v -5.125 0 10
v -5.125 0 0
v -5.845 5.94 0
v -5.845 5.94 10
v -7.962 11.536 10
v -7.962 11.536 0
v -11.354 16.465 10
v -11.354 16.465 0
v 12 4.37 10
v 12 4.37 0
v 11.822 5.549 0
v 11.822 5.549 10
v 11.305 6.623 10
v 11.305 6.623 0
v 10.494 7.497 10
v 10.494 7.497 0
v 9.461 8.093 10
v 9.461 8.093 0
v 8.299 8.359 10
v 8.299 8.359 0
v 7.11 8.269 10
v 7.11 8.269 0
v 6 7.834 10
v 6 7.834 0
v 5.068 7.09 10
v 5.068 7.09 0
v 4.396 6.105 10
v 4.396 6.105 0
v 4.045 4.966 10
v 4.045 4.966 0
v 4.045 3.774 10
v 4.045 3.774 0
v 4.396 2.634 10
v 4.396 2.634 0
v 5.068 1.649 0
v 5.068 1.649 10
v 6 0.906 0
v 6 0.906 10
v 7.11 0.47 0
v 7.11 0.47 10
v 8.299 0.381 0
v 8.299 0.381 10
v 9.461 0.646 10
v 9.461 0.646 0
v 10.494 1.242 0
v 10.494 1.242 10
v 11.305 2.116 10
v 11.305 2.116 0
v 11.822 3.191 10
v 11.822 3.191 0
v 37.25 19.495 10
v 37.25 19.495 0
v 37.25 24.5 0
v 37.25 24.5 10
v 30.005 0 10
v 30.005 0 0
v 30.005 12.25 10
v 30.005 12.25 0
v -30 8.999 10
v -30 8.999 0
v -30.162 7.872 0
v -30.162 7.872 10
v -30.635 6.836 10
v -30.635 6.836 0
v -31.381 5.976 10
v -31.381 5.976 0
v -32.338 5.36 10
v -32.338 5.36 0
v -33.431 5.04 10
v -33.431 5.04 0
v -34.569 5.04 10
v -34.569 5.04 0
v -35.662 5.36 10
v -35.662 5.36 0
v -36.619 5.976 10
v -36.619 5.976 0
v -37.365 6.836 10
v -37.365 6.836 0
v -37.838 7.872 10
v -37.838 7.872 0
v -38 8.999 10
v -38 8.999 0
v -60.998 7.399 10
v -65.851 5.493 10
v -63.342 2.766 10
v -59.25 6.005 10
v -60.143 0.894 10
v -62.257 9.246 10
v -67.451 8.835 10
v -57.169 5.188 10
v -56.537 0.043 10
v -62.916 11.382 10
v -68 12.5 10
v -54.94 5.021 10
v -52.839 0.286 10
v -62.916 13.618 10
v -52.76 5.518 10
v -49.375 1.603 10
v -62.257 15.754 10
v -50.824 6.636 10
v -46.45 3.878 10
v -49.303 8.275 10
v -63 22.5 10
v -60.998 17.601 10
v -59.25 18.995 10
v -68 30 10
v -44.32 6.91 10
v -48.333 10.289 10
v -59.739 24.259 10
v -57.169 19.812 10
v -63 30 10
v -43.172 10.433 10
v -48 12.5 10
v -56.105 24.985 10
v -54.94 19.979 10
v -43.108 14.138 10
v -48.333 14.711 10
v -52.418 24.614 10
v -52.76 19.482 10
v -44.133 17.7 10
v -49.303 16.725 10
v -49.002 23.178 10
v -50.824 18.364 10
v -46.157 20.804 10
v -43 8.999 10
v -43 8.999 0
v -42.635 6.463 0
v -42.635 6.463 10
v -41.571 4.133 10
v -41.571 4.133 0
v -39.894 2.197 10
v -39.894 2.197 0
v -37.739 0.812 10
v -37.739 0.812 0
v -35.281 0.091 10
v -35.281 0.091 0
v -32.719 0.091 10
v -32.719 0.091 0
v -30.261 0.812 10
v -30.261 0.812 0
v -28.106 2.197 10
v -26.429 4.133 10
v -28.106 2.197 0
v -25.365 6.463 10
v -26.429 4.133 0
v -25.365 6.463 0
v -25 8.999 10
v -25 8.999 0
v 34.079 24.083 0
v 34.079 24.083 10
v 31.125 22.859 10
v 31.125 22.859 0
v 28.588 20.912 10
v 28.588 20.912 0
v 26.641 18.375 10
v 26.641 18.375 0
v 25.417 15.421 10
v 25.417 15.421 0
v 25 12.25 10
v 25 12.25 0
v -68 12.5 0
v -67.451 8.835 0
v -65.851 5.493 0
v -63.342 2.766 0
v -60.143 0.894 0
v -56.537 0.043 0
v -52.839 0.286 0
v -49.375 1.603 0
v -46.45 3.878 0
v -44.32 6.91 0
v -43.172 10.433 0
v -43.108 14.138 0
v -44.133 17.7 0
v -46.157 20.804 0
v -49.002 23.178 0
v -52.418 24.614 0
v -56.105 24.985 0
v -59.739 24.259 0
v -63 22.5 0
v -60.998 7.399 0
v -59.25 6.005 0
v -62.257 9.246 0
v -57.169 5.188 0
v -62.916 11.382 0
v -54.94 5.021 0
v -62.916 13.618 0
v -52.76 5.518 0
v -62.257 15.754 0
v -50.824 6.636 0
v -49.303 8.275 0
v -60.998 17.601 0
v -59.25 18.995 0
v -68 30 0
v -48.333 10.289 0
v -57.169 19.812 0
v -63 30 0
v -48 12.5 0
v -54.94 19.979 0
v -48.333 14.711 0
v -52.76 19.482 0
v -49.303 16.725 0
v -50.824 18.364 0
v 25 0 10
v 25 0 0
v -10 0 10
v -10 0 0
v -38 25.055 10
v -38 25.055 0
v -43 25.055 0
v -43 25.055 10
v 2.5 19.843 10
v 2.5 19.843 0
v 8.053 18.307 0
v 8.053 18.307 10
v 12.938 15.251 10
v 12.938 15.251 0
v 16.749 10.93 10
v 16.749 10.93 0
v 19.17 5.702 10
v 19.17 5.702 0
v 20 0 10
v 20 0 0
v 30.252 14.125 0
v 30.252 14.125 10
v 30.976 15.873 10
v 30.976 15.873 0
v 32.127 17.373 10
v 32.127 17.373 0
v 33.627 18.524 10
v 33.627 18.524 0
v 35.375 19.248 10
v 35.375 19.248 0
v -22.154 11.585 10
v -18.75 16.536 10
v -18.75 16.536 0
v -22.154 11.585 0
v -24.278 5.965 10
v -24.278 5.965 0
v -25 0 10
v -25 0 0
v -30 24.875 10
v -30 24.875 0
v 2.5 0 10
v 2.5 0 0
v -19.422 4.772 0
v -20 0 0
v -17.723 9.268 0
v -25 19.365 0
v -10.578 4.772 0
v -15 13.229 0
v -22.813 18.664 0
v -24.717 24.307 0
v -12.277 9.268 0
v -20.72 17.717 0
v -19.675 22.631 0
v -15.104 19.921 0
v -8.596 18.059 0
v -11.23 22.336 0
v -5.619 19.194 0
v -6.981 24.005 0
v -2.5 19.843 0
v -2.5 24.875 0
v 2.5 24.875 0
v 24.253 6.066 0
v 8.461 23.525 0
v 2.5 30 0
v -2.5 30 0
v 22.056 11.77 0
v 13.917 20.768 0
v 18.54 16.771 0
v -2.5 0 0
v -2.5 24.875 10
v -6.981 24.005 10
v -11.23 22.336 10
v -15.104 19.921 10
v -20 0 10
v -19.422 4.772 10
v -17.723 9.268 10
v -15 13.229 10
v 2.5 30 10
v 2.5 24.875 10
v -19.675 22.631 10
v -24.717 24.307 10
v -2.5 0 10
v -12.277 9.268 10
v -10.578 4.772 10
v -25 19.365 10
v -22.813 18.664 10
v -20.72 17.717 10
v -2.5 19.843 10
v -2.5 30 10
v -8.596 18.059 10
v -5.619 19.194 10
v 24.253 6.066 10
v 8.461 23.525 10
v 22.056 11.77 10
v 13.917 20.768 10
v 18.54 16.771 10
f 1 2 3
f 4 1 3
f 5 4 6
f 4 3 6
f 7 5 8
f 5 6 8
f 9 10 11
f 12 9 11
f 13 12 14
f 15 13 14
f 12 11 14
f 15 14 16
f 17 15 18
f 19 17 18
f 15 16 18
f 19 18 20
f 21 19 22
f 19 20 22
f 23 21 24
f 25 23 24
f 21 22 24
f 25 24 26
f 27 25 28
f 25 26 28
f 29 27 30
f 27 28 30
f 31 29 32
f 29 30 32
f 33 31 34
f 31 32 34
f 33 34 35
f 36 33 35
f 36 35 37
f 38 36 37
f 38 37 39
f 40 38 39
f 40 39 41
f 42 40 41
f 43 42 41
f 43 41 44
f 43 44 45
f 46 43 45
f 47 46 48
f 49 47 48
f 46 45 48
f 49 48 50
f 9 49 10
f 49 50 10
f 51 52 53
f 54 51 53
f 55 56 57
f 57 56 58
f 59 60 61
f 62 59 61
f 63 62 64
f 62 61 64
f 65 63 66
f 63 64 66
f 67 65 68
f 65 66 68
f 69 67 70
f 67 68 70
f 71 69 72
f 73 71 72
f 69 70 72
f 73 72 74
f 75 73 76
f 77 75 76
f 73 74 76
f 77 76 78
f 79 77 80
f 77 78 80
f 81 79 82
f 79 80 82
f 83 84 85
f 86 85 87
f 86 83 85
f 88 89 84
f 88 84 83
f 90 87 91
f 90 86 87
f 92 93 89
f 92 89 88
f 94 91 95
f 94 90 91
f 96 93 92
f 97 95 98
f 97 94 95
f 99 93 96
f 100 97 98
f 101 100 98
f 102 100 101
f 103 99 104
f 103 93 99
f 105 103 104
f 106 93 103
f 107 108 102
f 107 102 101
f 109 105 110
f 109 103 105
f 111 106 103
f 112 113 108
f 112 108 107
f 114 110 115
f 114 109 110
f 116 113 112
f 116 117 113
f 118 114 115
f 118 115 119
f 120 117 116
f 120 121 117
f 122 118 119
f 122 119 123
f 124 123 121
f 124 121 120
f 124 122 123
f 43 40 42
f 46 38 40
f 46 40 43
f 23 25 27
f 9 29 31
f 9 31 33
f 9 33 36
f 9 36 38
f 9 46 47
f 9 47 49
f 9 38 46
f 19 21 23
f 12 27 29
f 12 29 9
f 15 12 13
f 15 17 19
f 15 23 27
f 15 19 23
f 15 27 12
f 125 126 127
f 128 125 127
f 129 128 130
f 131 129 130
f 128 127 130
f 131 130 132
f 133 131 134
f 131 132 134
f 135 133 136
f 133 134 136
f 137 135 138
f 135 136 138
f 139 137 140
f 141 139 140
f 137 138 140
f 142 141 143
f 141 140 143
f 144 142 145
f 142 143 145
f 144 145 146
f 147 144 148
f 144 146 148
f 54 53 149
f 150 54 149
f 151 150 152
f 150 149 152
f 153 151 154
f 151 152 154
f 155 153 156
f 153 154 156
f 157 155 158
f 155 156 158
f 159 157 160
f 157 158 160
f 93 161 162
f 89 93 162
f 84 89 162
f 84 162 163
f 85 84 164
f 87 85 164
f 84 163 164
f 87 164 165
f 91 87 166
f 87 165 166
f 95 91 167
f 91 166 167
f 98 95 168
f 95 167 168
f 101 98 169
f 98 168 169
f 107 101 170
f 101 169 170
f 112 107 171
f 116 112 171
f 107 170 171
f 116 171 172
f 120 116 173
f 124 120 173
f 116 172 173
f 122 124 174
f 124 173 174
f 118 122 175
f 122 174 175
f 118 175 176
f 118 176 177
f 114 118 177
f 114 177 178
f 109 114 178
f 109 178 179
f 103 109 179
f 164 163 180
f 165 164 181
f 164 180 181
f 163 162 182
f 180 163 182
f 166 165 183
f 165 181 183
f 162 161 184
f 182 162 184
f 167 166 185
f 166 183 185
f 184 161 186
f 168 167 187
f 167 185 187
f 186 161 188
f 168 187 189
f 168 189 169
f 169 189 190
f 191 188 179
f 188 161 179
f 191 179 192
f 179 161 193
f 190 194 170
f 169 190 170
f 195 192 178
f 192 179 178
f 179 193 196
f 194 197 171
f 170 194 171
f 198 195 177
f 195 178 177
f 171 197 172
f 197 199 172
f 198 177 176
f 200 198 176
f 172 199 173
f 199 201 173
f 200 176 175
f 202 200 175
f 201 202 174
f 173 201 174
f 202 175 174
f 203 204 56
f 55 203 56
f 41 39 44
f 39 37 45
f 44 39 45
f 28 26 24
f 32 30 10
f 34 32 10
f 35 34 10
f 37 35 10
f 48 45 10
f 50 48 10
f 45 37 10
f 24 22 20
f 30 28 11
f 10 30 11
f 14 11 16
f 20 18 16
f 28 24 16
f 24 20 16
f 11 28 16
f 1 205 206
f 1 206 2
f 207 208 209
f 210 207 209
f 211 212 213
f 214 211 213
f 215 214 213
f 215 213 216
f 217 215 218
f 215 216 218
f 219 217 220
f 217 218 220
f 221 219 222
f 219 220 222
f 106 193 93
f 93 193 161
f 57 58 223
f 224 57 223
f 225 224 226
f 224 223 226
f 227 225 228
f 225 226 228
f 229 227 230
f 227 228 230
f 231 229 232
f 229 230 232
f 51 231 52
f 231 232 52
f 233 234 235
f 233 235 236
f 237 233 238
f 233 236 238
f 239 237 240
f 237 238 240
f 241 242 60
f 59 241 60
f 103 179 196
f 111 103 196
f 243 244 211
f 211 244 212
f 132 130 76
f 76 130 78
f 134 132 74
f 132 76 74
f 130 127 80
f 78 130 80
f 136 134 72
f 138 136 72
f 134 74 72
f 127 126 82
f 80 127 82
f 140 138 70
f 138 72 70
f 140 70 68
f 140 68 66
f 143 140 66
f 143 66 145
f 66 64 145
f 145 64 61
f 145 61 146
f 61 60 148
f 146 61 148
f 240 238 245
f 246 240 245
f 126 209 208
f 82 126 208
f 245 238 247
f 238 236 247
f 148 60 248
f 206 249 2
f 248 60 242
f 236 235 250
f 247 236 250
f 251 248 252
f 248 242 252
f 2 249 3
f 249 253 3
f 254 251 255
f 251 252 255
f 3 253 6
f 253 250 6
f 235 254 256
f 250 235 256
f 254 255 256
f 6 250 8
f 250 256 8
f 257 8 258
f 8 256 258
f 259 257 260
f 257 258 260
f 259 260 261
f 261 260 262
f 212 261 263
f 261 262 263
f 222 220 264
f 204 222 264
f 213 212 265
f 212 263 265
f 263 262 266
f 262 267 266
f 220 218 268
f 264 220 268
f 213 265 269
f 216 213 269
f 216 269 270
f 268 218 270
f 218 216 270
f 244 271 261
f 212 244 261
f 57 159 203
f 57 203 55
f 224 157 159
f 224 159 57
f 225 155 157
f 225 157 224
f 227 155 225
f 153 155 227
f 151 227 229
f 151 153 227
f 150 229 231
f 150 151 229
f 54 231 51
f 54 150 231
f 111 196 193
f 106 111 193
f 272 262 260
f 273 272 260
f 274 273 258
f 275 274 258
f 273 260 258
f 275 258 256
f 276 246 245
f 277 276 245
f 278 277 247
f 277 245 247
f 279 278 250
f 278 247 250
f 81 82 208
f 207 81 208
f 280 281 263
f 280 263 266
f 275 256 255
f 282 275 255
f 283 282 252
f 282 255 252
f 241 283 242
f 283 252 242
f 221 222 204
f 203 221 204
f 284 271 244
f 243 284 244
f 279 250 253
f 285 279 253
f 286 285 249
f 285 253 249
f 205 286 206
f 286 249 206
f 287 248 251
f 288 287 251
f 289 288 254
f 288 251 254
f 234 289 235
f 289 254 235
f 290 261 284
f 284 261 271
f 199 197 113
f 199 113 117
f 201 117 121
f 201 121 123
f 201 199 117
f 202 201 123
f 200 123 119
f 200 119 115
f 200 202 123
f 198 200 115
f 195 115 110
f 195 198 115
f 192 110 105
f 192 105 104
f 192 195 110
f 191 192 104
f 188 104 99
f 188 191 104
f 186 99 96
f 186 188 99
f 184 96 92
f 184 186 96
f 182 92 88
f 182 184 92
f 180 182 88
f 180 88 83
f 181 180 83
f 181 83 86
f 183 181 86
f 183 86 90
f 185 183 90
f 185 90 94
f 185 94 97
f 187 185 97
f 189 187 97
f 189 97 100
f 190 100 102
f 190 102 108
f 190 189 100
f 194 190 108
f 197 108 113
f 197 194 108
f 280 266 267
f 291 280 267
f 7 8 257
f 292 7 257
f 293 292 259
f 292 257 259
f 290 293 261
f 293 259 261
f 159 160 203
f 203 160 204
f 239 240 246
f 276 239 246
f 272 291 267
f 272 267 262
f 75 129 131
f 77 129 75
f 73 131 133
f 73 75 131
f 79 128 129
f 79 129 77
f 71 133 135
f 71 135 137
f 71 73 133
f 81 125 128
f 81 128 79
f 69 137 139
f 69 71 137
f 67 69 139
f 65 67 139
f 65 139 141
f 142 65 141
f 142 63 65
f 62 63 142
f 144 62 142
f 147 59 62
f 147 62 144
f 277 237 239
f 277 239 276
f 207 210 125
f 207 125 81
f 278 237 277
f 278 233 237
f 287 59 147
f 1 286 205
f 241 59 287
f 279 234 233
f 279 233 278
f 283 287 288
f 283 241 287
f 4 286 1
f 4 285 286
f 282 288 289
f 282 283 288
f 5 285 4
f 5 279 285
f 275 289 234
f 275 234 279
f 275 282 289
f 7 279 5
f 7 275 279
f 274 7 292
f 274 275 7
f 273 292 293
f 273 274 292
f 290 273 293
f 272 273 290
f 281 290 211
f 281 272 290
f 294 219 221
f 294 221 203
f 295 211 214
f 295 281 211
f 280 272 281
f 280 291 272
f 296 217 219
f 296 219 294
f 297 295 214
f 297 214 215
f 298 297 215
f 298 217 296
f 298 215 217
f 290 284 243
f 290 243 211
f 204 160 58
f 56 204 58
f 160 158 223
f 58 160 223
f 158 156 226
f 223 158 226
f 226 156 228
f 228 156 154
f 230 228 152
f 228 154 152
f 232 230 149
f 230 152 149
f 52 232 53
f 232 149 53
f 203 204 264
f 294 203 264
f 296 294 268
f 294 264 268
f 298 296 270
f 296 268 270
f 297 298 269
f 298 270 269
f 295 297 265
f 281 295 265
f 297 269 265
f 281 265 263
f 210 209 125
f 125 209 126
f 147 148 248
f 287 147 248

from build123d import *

# Parameters (mm, degrees)
SKETCH_1_R        = 7.5
EXTRUDE_1_DEPTH   = 10
EXTRUDE_1_2_DEPTH = 10
EXTRUDE_1_3_DEPTH = 10
SKETCH_1_R_2      = 4
EXTRUDE_1_4_DEPTH = 10


with BuildPart() as part:
    # Эскиз1 → Бобышка-Вытянуть1 (new body)
    with BuildSketch(Plane.XY):
        with BuildLine():
            ThreePointArc((-68, 12.5), (-44.319660113, 6.909830056), (-63, 22.5))
            Line((-63, 22.5), (-63, 30))
            Line((-63, 30), (-68, 30))
            Line((-68, 30), (-68, 12.5))
        make_face()
        with Locations((-55.5, 12.5)):
            Circle(SKETCH_1_R, mode=Mode.SUBTRACT)
    extrude(amount=EXTRUDE_1_DEPTH)


with BuildPart() as body_2:
    # Эскиз1 → Extrude 1 2 (new body)
    with BuildSketch(Plane.XY):
        with BuildLine():
            Line((2.5, 24.874685928), (2.5, 30))
            Line((2.5, 30), (-2.5, 30))
            Line((-2.5, 30), (-2.5, 24.874685928))
            ThreePointArc((-2.5, 24.874685928), (-9.14386728, 23.267782257), (-15.104166667, 19.921449478))
            ThreePointArc((-15.104166667, 19.921449478), (-22.151108326, 23.603917037), (-30, 24.874685928))
            Line((-30, 24.874685928), (-30, 8.998997376))
            ThreePointArc((-30, 8.998997376), (-34, 4.998997376), (-38, 8.998997376))
            Line((-38, 8.998997376), (-38, 25.054939633))
            Line((-38, 25.054939633), (-43, 25.054939633))
            Line((-43, 25.054939633), (-43, 12.5))
            Line((-43, 12.5), (-43, 8.998997376))
            ThreePointArc((-43, 8.998997376), (-34, -0.001002624), (-25, 8.998997376))
            Line((-25, 8.998997376), (-25, 19.364916731))
            ThreePointArc((-25, 19.364916731), (-21.752794759, 18.220417276), (-18.75, 16.535945694))
            ThreePointArc((-18.75, 16.535945694), (-23.385358667, 8.838834765), (-25, 0))
            Line((-25, 0), (-20, 0))
            ThreePointArc((-20, 0), (-18.708286934, 7.071067812), (-15, 13.228756555))
            ThreePointArc((-15, 13.228756555), (-11.291713066, 7.071067812), (-10, 0))
            Line((-10, 0), (-5.125314072, 0))
            ThreePointArc((-5.125314072, 0), (-6.73458309, 8.801725739), (-11.354166667, 16.464595328))
            ThreePointArc((-11.354166667, 16.464595328), (-7.130085259, 18.685873921), (-2.5, 19.843134833))
            Line((-2.5, 19.843134833), (-2.5, 0))
            Line((-2.5, 0), (2.5, 0))
            Line((2.5, 0), (2.5, 19.843134833))
            ThreePointArc((2.5, 19.843134833), (15, 13.228756555), (20, 0))
            Line((20, 0), (25, 0))
            ThreePointArc((25, 0), (18.540496218, 16.770509831), (2.5, 24.874685928))
        make_face()
    extrude(amount=EXTRUDE_1_2_DEPTH)


with BuildPart() as body_3:
    # Эскиз1 → Extrude 1 3 (new body)
    with BuildSketch(Plane.XY):
        with BuildLine():
            Line((25, 12.25), (25, 0))
            Line((25, 0), (30.004893159, 0))
            Line((30.004893159, 0), (30.004893159, 12.25))
            ThreePointArc((30.004893159, 12.25), (32.126935822, 17.373064178), (37.25, 19.495106841))
            Line((37.25, 19.495106841), (37.25, 24.5))
            ThreePointArc((37.25, 24.5), (28.58794193, 20.91205807), (25, 12.25))
        make_face()
    extrude(amount=EXTRUDE_1_3_DEPTH)


with BuildPart() as body_4:
    # Эскиз1 → Extrude 1 4 (new body)
    with BuildSketch(Plane.XY):
        with Locations((8, 4.369690994)):
            Circle(SKETCH_1_R_2)
    extrude(amount=EXTRUDE_1_4_DEPTH)


solid = Compound([part.part, body_2.part, body_3.part, body_4.part])
